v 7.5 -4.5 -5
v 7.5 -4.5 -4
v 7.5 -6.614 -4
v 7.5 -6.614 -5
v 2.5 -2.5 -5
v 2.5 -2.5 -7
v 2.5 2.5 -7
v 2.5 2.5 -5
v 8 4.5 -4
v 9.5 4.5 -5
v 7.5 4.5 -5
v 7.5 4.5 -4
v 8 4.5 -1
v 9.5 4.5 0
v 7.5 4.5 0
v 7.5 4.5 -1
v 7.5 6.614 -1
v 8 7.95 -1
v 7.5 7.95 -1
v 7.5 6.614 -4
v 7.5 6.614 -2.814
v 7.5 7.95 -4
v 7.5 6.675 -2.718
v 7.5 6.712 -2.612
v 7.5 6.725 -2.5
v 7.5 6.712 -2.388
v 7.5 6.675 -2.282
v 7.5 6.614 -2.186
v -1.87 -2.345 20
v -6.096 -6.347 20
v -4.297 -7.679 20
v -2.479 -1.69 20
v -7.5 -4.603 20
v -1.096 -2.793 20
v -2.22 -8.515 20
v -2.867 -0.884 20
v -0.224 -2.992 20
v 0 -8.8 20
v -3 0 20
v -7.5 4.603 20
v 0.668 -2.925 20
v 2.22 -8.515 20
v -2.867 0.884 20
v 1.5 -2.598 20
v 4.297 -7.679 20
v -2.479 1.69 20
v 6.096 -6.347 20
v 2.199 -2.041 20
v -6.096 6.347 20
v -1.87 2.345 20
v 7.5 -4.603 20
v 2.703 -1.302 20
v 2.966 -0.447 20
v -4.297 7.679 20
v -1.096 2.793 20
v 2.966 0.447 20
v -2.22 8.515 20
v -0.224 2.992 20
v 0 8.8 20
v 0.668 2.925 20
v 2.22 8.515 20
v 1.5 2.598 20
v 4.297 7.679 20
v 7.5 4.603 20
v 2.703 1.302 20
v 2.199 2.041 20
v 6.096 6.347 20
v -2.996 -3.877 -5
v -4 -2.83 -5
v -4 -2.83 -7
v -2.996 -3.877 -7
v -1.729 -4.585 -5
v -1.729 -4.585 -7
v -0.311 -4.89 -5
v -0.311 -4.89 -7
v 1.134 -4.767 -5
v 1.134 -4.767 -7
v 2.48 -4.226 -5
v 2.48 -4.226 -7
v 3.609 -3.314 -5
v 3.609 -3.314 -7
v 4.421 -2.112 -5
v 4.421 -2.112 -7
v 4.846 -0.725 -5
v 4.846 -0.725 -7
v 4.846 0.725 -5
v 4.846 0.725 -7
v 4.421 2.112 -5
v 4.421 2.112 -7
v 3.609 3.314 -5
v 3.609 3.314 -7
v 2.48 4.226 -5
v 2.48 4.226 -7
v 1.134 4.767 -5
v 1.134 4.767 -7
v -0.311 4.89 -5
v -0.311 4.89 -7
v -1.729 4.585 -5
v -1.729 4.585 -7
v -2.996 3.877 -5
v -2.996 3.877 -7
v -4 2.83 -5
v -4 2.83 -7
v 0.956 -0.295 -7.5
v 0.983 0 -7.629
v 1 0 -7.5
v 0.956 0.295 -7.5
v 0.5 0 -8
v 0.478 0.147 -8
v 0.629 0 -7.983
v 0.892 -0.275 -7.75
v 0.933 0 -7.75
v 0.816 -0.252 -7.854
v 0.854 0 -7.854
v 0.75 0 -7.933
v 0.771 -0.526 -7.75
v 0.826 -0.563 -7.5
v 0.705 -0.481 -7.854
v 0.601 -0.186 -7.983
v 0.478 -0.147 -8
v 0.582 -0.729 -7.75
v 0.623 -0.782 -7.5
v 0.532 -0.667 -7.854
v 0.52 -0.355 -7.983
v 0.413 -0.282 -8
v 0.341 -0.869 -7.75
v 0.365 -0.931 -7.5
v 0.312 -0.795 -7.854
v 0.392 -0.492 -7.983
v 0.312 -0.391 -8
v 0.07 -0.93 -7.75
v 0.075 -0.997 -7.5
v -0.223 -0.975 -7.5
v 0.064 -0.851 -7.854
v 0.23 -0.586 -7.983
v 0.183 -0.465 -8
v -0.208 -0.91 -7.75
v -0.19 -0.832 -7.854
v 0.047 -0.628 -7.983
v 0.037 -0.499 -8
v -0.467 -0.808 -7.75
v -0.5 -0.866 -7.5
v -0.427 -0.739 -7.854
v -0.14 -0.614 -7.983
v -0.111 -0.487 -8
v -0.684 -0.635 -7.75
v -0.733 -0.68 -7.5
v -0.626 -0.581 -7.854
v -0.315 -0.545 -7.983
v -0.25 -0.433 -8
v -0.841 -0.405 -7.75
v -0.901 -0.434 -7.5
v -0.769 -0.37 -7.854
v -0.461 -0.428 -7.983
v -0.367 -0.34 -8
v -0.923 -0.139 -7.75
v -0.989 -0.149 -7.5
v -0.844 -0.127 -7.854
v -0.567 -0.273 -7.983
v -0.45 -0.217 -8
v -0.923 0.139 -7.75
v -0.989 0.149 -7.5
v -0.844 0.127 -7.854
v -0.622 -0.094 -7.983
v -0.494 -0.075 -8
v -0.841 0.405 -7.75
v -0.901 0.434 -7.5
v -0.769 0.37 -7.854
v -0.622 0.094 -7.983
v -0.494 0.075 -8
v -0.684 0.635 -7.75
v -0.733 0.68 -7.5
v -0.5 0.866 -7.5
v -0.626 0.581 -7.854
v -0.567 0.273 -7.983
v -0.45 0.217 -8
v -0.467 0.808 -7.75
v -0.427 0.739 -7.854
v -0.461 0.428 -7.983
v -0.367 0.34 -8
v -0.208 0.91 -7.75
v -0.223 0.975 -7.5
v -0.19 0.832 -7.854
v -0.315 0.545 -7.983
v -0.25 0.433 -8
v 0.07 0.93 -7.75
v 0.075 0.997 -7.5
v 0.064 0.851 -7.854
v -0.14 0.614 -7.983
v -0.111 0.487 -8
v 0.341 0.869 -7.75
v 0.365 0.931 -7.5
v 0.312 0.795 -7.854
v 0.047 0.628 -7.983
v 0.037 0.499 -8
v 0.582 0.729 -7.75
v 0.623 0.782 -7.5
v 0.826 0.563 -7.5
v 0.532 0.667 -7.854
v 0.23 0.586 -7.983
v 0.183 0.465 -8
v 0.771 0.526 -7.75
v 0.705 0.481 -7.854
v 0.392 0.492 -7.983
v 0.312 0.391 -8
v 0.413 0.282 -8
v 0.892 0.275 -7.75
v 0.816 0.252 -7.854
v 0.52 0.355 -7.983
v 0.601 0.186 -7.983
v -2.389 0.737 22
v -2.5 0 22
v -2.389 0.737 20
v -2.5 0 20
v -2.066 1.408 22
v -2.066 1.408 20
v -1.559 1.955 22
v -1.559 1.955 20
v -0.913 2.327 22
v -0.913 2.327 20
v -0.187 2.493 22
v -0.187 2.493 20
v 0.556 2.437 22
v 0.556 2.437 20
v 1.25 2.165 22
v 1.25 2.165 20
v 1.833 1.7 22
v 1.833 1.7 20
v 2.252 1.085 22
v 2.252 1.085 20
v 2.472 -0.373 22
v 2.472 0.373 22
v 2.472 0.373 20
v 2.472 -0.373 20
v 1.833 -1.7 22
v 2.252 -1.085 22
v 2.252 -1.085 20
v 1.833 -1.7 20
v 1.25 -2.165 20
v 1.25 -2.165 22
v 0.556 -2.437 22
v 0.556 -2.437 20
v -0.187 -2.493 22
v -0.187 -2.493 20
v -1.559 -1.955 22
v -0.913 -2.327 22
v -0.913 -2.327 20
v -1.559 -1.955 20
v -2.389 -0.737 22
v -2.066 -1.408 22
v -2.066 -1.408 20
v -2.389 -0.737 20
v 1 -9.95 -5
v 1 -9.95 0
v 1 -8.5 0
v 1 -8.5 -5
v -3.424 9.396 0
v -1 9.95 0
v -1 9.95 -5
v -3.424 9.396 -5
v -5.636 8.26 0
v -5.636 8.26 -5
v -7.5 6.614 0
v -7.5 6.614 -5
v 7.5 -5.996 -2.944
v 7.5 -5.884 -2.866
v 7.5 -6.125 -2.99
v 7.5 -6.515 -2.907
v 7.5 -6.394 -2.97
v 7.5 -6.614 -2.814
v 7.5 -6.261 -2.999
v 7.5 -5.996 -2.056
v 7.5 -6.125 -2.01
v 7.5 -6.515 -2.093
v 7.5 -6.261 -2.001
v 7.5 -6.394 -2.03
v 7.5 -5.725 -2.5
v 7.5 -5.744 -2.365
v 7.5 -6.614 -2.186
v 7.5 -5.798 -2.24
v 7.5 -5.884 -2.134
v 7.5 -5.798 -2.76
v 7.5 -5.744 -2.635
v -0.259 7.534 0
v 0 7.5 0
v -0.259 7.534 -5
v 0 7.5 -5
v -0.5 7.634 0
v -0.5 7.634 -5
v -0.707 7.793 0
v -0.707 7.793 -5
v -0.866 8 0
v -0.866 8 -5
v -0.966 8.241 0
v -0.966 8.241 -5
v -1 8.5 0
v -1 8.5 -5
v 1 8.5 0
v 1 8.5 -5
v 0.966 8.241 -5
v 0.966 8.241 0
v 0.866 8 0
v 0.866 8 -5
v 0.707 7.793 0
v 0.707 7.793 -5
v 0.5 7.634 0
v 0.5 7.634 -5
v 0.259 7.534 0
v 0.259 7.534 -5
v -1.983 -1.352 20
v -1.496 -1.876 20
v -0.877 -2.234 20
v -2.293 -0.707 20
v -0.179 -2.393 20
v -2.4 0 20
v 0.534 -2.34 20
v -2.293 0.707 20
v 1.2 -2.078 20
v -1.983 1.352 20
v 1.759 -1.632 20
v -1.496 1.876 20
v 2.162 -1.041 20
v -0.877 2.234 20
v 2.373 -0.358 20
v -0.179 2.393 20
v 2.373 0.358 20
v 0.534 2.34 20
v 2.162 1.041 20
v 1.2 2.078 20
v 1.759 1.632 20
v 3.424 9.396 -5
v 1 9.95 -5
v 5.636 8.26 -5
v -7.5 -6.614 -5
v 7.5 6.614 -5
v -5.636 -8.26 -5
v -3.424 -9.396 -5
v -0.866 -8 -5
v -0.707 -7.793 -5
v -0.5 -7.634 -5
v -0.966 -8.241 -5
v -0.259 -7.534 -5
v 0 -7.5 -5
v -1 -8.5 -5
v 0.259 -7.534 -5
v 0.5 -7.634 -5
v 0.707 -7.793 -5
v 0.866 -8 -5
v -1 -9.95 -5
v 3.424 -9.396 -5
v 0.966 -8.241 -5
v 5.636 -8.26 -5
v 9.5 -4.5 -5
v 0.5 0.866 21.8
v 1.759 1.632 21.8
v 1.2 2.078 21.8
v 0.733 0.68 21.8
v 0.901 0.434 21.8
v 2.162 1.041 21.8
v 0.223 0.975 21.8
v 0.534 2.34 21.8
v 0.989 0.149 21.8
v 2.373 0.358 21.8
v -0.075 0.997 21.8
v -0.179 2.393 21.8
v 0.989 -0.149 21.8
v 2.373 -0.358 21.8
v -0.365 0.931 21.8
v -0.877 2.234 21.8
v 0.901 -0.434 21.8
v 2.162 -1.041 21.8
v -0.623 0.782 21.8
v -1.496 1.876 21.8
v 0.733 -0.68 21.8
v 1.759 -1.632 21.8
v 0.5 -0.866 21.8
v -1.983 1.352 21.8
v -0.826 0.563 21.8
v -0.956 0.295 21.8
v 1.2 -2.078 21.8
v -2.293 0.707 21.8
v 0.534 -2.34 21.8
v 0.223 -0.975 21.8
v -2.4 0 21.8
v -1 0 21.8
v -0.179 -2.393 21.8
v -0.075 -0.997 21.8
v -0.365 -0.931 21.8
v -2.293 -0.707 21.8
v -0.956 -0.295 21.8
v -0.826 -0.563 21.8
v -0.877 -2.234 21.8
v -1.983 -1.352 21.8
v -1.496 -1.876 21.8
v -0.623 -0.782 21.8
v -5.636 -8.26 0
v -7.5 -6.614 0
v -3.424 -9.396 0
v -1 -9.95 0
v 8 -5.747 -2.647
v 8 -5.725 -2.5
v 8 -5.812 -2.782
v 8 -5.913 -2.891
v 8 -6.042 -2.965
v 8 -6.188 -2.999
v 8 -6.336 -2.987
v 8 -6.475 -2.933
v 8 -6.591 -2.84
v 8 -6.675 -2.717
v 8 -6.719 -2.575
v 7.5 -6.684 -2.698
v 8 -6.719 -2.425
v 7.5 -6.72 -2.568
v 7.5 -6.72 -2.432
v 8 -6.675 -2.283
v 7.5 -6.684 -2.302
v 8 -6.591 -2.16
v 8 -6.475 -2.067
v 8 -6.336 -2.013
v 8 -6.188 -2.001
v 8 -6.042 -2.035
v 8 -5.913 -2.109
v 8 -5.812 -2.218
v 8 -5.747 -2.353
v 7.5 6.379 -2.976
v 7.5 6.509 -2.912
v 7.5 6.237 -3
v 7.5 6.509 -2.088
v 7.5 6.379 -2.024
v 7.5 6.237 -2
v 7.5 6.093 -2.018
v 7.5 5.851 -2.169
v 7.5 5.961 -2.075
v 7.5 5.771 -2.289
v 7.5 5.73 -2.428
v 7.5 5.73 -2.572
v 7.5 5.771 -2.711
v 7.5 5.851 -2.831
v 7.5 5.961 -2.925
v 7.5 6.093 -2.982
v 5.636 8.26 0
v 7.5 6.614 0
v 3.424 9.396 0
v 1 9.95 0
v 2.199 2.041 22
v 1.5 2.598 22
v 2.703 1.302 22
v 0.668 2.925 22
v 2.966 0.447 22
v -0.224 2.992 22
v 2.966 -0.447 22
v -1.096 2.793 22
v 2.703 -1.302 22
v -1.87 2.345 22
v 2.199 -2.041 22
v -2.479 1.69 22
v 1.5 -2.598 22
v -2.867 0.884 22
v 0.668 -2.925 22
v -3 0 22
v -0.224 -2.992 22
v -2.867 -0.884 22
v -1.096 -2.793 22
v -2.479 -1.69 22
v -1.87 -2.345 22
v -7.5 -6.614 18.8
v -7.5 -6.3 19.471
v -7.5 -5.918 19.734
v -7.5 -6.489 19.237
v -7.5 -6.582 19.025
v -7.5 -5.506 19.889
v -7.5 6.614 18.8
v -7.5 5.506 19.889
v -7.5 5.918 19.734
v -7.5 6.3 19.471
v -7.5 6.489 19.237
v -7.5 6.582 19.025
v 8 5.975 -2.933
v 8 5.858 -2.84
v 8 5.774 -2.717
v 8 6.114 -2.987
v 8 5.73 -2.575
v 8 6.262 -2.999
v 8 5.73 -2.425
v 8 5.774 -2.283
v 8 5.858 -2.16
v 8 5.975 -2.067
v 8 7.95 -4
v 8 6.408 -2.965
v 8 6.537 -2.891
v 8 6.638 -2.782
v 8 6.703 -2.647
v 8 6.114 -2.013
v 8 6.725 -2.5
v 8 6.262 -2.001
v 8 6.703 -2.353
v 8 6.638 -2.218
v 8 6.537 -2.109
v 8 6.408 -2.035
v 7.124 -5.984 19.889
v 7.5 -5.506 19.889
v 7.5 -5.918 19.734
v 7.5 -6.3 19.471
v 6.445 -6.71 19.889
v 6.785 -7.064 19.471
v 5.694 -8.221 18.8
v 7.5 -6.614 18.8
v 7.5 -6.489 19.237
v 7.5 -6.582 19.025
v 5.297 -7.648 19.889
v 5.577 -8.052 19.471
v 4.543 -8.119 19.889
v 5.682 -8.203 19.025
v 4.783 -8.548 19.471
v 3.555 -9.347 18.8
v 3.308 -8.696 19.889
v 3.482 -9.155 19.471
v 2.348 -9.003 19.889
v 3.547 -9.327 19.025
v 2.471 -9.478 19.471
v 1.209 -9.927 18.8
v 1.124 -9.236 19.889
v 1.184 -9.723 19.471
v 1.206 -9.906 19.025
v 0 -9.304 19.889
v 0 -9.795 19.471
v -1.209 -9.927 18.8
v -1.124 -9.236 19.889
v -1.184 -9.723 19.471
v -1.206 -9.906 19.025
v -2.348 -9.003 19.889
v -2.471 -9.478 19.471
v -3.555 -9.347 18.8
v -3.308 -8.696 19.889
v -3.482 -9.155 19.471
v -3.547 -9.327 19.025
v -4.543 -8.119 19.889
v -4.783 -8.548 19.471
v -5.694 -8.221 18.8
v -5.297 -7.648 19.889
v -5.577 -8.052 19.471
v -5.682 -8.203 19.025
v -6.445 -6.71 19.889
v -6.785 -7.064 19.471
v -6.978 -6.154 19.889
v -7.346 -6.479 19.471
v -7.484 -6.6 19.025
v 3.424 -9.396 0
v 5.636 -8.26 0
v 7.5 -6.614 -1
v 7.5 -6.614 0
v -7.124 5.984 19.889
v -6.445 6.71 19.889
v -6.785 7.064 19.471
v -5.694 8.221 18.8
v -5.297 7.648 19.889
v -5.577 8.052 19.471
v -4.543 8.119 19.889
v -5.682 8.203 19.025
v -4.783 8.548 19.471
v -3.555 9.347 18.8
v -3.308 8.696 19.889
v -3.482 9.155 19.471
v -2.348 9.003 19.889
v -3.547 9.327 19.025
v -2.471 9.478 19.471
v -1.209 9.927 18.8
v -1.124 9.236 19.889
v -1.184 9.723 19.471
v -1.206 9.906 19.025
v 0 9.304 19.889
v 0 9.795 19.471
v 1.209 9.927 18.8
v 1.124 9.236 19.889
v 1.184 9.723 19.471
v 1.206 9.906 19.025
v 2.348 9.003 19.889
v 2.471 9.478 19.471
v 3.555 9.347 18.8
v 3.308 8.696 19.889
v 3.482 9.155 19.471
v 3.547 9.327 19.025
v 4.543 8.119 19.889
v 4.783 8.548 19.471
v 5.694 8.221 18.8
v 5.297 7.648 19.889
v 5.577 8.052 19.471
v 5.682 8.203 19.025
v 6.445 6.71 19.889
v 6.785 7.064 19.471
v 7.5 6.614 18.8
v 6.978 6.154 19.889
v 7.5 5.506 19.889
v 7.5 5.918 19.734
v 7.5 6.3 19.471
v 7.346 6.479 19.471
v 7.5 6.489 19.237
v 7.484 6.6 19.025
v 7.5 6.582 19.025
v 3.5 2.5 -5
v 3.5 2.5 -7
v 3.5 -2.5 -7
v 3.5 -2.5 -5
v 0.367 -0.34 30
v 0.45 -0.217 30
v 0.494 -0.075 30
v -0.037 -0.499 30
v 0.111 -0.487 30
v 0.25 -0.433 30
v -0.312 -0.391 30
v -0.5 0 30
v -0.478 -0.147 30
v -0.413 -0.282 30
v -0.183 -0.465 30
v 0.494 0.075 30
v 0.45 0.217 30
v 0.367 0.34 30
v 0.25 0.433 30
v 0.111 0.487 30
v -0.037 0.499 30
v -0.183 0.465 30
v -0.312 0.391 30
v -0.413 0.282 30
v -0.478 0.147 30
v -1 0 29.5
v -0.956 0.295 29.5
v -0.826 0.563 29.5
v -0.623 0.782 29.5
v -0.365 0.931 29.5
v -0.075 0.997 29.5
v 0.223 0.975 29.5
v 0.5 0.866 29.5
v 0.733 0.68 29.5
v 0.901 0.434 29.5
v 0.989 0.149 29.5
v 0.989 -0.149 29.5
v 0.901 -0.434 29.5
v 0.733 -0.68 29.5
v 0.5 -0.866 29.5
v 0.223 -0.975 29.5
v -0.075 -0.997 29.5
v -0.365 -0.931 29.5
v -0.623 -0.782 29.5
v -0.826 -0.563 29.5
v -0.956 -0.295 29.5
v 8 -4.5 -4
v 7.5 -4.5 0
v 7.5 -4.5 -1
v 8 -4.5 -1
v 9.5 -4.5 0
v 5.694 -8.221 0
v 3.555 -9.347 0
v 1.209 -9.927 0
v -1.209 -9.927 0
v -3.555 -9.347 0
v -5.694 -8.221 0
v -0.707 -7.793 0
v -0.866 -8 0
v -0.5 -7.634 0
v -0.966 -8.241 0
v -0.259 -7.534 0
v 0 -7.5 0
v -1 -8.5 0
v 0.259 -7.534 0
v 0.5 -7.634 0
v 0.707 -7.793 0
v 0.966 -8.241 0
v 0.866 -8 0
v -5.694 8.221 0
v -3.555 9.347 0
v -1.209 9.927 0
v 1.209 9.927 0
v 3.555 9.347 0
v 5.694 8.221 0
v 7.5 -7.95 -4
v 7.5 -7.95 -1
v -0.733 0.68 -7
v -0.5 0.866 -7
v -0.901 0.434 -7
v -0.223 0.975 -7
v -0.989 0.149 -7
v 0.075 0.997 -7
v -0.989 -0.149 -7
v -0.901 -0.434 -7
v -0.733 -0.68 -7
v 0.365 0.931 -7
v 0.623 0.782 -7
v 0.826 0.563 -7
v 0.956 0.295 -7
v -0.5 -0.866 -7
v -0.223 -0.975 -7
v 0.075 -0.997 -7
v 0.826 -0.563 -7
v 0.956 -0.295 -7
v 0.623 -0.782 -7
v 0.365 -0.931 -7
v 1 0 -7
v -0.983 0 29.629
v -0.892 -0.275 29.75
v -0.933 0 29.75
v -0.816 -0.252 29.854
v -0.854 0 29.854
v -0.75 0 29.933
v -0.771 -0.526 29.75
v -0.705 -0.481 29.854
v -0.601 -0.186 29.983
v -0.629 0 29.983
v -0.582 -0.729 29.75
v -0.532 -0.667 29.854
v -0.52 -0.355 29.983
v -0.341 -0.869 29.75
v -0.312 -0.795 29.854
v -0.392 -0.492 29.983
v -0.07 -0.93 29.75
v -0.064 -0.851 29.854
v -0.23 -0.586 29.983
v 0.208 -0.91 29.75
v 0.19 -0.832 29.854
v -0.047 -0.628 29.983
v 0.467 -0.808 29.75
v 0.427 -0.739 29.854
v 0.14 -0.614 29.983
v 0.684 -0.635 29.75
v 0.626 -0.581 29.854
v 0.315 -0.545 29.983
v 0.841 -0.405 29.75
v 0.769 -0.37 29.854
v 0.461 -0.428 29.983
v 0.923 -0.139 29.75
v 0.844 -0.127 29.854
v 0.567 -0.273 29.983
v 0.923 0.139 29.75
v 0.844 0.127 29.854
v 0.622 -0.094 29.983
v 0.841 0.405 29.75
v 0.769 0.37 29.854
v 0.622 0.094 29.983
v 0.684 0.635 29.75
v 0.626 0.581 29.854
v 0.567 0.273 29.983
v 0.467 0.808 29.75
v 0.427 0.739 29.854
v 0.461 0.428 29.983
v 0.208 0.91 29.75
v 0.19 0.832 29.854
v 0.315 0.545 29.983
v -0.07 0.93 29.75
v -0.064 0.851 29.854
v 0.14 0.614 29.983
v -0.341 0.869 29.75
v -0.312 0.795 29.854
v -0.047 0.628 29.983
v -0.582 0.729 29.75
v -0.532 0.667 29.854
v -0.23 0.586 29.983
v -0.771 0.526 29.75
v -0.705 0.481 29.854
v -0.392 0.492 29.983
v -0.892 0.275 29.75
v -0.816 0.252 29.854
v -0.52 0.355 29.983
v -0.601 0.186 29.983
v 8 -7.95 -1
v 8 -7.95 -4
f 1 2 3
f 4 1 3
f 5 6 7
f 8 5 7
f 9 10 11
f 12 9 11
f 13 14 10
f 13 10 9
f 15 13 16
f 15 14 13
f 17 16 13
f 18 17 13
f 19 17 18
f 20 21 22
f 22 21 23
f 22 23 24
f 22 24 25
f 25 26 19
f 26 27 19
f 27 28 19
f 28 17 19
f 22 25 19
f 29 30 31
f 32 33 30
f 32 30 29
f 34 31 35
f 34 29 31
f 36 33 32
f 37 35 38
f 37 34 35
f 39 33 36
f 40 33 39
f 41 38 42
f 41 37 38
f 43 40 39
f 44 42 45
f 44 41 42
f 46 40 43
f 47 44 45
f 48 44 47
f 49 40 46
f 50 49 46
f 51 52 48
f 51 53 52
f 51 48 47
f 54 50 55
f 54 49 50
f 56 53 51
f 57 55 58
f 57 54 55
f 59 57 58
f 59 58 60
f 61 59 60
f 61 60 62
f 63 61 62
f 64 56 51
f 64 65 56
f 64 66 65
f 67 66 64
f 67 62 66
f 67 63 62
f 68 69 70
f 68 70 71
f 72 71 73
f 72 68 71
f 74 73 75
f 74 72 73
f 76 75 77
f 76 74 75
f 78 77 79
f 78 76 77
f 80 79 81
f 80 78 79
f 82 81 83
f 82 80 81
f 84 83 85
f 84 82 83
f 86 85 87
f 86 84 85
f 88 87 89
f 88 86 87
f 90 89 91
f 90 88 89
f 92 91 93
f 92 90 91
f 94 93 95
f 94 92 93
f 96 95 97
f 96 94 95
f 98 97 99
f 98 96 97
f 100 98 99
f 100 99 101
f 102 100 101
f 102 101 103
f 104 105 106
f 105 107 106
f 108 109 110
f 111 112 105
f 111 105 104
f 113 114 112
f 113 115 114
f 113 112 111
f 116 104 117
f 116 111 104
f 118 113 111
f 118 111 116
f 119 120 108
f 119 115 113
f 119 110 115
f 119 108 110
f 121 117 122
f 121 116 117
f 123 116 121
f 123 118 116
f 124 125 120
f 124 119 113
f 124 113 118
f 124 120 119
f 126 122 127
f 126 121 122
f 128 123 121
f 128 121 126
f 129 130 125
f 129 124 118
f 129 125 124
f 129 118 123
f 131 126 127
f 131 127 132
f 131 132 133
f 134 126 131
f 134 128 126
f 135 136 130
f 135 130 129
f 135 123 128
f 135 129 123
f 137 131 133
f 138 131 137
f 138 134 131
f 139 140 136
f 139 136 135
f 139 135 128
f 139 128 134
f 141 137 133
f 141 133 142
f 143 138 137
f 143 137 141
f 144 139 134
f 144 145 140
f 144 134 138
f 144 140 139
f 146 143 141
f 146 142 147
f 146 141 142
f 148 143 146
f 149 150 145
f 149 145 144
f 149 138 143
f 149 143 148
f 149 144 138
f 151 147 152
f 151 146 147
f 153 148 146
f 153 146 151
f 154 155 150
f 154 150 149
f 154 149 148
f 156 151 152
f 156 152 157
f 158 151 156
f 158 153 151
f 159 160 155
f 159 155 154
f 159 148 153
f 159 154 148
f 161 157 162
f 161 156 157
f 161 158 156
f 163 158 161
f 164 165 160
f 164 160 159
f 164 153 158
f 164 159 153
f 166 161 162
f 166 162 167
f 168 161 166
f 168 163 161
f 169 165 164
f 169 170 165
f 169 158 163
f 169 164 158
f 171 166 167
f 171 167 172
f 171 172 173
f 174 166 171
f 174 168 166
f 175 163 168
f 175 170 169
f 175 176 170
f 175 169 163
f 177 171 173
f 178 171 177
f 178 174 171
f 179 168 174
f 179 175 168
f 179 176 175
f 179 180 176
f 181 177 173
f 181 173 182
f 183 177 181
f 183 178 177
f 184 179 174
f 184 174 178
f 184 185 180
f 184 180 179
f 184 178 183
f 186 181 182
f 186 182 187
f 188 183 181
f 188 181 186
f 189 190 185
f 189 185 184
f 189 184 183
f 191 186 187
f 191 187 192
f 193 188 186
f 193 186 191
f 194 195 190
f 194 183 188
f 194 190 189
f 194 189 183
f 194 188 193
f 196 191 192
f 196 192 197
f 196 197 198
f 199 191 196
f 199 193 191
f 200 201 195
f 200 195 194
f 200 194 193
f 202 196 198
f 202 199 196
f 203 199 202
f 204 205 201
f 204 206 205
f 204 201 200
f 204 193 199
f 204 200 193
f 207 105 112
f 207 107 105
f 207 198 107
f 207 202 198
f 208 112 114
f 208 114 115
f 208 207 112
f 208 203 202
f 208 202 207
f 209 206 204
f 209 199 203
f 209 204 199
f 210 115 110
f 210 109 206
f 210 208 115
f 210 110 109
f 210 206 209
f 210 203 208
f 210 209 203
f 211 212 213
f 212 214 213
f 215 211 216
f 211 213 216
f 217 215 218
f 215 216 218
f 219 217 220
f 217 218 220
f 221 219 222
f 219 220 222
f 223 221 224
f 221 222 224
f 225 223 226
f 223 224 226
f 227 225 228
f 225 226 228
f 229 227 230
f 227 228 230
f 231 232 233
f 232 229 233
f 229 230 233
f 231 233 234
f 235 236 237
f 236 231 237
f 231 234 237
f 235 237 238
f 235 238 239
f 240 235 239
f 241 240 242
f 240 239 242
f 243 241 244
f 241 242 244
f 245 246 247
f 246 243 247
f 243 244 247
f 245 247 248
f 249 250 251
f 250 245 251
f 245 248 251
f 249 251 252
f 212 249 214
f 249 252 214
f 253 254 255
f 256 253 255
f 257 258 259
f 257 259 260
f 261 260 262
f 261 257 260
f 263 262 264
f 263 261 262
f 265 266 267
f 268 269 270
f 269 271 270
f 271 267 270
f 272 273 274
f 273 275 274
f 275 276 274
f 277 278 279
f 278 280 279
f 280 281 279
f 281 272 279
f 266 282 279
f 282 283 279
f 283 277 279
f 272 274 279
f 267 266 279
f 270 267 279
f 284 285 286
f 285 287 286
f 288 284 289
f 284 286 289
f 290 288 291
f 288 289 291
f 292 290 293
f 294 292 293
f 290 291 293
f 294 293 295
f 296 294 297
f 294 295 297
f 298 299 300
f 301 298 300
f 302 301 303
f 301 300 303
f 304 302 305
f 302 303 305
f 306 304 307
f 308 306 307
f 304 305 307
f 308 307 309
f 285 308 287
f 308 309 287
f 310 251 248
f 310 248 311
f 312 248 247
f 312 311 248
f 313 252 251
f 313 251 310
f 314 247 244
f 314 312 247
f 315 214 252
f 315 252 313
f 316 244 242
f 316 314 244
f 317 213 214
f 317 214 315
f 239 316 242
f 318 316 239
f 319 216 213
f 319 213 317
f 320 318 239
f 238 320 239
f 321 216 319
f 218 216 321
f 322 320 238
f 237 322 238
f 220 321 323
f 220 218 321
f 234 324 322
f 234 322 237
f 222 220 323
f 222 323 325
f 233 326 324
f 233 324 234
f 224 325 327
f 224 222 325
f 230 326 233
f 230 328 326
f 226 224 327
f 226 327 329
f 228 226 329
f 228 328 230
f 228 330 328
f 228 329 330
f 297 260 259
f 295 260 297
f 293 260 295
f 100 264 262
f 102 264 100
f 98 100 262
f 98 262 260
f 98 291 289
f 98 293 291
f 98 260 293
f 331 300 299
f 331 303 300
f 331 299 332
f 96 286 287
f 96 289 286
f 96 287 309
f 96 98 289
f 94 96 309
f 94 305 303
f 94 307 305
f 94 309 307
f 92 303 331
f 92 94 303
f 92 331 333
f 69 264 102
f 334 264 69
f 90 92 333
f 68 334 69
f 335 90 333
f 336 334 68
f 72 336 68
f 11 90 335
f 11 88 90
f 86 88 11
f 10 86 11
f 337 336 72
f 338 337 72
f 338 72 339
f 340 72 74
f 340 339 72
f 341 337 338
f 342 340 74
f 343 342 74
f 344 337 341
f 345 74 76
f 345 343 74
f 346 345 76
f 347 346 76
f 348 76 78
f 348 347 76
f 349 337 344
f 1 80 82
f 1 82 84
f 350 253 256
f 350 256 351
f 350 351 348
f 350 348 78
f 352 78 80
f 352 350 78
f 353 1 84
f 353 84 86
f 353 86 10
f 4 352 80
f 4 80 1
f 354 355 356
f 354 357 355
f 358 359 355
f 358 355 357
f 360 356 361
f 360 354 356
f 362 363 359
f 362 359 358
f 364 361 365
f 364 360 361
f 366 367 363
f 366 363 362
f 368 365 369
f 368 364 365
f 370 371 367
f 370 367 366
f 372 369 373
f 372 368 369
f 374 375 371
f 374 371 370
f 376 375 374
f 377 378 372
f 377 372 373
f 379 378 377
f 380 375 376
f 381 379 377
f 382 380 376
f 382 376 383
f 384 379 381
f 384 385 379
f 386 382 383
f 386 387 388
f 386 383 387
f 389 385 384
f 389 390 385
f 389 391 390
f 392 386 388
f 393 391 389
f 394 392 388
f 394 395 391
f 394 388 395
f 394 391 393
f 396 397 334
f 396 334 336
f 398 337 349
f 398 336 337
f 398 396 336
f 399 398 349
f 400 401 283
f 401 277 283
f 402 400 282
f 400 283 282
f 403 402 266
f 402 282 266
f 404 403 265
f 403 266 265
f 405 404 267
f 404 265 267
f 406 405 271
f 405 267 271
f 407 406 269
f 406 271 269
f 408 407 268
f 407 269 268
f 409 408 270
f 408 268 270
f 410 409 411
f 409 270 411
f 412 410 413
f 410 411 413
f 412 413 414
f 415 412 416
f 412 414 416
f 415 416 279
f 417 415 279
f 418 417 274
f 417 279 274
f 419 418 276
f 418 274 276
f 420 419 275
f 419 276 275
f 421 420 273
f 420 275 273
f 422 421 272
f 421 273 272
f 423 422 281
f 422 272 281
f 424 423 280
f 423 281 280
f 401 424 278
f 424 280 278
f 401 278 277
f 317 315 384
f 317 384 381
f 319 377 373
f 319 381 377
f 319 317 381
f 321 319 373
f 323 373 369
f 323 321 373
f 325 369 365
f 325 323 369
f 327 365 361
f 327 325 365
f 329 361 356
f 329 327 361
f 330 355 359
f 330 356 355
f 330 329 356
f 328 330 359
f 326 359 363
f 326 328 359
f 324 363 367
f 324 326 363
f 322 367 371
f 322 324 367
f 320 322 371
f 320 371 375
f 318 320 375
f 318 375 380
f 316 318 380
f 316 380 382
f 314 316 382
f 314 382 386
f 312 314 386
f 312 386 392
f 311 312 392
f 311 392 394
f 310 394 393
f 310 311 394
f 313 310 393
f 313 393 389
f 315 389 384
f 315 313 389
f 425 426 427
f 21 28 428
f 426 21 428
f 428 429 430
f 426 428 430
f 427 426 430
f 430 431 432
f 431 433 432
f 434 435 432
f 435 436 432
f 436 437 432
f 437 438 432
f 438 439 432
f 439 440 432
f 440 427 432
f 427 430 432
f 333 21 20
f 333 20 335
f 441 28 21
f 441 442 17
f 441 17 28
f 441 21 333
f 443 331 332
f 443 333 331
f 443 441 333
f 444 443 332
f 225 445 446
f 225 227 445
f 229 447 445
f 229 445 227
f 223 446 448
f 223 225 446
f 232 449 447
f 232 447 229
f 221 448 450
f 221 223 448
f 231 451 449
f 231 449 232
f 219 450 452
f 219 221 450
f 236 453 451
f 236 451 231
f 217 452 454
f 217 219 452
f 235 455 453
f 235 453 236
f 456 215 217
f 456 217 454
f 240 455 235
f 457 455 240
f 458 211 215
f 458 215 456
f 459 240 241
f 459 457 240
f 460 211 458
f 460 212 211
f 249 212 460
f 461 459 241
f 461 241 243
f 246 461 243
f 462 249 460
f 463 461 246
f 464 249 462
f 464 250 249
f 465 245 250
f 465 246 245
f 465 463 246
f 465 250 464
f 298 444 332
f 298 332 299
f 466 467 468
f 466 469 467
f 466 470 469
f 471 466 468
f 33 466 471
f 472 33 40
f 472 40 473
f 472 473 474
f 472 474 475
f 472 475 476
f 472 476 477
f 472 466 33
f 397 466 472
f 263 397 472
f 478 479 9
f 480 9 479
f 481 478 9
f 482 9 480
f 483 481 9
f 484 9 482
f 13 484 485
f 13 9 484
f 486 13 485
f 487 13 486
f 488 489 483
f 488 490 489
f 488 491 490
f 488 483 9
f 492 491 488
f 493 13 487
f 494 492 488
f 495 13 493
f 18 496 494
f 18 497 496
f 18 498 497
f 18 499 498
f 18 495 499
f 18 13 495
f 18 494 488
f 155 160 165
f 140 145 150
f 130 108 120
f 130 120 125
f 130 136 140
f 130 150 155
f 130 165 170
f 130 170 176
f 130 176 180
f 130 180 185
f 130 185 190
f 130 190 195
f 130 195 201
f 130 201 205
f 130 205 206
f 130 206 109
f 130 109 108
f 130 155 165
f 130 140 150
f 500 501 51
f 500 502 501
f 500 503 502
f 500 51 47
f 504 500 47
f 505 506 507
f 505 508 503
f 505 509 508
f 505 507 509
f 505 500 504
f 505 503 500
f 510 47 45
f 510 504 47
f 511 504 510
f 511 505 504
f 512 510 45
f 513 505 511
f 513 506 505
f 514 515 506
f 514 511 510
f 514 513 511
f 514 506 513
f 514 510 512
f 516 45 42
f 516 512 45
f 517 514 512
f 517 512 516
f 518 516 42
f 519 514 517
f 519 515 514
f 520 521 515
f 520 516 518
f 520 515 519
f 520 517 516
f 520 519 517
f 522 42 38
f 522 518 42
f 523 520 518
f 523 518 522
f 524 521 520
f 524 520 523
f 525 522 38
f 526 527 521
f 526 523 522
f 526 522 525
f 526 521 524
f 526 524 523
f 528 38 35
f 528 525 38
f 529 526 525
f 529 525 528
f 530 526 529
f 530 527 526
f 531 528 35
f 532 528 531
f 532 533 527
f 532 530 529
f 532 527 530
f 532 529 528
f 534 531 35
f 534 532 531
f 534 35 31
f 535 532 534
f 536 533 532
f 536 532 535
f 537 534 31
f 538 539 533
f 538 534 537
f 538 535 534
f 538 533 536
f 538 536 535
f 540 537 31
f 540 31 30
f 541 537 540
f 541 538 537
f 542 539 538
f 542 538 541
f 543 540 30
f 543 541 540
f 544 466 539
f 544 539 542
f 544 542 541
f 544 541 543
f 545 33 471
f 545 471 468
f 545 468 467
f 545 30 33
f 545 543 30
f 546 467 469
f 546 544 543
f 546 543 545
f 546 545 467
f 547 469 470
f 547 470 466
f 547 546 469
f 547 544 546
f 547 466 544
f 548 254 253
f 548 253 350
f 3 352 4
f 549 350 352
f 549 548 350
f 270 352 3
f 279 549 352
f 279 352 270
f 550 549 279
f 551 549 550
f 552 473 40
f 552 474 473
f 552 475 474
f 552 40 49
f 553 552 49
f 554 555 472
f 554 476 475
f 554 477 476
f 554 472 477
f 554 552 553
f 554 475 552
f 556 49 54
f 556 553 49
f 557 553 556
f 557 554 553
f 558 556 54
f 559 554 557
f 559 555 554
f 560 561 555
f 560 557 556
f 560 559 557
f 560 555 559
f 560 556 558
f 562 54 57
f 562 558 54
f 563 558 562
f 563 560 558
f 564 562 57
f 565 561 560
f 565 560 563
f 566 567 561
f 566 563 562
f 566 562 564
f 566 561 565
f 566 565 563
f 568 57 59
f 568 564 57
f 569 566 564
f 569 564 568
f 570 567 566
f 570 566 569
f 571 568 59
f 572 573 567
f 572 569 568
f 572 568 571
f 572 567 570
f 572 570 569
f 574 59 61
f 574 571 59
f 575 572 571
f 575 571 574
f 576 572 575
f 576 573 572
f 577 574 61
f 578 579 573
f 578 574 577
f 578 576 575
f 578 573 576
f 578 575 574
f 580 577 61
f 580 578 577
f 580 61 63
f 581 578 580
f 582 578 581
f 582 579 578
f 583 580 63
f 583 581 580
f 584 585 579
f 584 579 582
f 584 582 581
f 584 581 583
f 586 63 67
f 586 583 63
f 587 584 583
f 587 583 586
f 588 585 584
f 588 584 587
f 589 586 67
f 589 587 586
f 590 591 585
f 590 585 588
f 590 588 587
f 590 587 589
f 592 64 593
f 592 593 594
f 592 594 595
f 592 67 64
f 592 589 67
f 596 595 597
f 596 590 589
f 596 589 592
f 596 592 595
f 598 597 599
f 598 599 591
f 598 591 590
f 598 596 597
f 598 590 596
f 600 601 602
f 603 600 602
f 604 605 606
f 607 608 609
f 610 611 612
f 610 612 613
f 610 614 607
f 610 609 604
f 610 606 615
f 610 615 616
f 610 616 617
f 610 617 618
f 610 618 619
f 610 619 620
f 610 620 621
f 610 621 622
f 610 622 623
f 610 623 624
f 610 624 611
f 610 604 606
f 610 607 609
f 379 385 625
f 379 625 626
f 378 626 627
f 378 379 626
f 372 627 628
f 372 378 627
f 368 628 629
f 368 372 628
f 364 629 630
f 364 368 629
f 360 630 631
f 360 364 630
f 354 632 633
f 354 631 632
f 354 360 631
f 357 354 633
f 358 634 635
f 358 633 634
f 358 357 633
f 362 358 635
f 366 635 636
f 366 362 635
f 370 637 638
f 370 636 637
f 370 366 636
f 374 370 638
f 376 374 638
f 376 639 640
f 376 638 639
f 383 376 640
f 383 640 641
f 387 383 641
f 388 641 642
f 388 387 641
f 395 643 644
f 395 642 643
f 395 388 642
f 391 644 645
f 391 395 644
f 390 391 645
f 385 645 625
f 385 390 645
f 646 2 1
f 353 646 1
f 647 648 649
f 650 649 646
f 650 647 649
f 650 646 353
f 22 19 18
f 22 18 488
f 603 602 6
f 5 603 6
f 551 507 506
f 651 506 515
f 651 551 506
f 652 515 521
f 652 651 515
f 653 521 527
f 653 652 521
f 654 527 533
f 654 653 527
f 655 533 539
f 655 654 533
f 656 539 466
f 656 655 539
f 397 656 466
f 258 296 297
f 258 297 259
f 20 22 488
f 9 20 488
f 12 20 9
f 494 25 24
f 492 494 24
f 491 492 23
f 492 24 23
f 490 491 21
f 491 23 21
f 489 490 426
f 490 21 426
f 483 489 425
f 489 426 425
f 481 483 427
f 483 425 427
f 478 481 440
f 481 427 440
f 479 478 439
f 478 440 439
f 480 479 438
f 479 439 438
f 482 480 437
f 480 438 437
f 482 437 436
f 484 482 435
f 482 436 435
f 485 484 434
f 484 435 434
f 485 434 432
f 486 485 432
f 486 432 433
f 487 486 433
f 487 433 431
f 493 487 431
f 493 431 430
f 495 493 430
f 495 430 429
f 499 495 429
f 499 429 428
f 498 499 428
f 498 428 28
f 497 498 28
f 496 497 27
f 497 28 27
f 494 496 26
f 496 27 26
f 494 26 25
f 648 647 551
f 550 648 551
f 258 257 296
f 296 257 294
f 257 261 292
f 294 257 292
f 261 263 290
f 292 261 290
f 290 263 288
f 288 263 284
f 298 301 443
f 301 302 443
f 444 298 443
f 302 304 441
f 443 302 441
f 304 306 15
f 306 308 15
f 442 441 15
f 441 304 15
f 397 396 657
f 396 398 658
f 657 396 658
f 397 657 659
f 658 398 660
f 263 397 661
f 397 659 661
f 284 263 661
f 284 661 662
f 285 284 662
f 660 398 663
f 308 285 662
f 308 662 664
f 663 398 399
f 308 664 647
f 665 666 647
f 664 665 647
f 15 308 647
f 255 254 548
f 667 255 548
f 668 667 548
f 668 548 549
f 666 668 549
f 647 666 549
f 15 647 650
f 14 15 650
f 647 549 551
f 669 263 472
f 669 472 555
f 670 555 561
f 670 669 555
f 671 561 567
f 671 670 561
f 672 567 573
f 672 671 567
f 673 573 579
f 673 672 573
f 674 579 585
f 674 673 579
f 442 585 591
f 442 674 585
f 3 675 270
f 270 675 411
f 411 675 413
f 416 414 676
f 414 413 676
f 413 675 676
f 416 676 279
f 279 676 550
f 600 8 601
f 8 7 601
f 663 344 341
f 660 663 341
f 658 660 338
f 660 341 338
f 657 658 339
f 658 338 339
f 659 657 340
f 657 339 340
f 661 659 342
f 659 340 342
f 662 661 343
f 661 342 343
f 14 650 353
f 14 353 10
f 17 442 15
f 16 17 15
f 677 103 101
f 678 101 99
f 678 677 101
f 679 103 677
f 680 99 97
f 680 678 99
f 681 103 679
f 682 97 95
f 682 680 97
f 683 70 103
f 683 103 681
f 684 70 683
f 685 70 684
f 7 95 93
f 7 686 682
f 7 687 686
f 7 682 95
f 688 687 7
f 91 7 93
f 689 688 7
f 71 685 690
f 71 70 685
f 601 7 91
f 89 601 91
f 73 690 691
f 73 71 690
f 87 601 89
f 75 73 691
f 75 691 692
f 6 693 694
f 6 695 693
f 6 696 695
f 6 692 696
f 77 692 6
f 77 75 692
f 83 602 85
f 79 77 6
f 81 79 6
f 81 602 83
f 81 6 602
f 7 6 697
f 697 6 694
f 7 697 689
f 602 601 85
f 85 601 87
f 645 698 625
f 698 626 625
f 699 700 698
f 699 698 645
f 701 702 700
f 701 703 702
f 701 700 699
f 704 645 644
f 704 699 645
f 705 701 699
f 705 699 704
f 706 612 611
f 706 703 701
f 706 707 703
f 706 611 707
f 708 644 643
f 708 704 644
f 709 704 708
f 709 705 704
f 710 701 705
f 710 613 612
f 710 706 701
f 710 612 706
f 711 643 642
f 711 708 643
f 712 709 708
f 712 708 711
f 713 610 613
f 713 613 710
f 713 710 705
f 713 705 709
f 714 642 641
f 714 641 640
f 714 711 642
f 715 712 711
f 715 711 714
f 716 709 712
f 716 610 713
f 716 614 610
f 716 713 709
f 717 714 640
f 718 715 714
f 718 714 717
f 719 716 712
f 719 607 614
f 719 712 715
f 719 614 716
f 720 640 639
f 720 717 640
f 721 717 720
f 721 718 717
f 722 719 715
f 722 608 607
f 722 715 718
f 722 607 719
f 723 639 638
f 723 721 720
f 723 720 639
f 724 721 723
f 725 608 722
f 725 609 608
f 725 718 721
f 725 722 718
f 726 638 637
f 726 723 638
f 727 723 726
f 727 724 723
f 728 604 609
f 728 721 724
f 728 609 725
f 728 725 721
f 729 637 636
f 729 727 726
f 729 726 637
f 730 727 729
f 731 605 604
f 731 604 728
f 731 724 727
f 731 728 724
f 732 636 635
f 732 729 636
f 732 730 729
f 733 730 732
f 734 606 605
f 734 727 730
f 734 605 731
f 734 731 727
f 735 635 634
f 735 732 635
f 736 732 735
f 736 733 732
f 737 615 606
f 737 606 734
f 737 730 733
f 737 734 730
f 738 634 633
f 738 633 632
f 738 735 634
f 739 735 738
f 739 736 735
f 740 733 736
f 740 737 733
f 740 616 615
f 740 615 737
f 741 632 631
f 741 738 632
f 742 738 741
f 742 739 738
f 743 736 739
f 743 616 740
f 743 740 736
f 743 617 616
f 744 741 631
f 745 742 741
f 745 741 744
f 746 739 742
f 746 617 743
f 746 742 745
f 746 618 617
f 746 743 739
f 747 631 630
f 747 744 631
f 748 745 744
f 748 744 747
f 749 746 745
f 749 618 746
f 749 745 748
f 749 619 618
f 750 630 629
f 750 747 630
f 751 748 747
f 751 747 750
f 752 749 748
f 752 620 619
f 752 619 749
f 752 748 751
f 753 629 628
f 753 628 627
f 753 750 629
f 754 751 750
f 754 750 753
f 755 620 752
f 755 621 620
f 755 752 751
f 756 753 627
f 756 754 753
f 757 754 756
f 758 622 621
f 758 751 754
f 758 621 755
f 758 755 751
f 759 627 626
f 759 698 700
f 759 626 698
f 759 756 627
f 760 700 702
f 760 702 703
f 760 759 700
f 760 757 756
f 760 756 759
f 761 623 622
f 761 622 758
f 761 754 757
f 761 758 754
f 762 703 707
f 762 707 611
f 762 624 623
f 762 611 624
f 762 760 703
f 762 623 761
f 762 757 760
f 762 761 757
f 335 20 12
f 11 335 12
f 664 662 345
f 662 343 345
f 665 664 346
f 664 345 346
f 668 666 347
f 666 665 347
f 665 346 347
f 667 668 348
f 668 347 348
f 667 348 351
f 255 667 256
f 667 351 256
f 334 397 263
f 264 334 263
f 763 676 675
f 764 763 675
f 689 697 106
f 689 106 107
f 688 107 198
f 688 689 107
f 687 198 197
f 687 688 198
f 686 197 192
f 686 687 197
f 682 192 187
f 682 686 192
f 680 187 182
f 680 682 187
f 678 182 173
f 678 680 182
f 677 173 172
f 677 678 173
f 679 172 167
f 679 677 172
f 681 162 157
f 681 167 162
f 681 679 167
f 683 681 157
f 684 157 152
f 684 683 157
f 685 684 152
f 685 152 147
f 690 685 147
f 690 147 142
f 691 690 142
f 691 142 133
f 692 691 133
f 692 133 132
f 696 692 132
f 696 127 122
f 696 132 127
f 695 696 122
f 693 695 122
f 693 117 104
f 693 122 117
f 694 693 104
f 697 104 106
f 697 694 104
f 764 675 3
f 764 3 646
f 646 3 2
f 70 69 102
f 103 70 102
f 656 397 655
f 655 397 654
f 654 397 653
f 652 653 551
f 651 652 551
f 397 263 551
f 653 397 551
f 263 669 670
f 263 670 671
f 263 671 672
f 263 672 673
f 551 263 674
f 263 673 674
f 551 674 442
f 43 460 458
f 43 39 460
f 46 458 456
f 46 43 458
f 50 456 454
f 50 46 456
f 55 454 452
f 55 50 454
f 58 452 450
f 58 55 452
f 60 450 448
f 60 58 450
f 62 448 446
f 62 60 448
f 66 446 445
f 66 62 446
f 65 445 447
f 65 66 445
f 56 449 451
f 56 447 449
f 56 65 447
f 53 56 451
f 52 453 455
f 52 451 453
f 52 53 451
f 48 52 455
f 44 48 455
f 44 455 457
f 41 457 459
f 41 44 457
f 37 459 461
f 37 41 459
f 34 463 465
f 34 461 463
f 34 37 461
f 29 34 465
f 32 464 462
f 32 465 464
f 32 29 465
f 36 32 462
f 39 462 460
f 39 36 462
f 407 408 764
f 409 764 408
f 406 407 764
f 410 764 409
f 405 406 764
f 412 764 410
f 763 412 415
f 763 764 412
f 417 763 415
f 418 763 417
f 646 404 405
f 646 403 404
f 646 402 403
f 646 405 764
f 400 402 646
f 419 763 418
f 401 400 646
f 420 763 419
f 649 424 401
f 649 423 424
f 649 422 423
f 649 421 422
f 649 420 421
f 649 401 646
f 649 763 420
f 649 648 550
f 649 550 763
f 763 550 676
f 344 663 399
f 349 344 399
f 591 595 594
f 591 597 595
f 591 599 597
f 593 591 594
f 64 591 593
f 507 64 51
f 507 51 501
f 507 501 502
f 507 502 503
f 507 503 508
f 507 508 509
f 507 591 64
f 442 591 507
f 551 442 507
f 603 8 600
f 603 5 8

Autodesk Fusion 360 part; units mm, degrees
sketch "Sketch1" plane through (0, 0, 0) normal (0, 0, 1) x (1, 0, 0)
  line L0 (7.5, -10) -> (-7.5, -10)
  line L1 (-7.5, -10) -> (-7.5, 10)
  line L2 (-7.5, 10) -> (7.5, 10)
  line L3 (7.5, 10) -> (7.5, -10)
  line L4 (7.5, -10) -> (-7.5, 10) construction
  line L5 (-7.5, -10) -> (7.5, 10) construction
  circle A0 centre (0, 0) radius 10
  dimension "d1" = 15
  dimension "d2" = 20
  dimension "d3" = 20
extrude "Extrude1" add sketch "Sketch1" along normal blind 20 contours L1 L3 A0 makes body 1
sketch "Sketch2" plane through (0, 0, 20) normal (0, 0, 1) x (-1, 0, 0)
  arc A0 (7.5, 6.6144) -> (-7.5, 6.6144) centre (0, 0) ccw
  line L0 (-7.5, 6.6144) -> (-7.5, -6.6144)
  arc A1 (-7.5, -6.6144) -> (7.5, -6.6144) centre (0, 0) ccw
  line L1 (7.5, -6.6144) -> (7.5, 6.6144)
  circle A2 centre (0, 0) radius 3
  circle A3 centre (0, 0) radius 1
  circle A4 centre (0, 0) radius 2.5
  circle A5 centre (0, 0) radius 2.4
  dimension "d6" = 6
  dimension "d7" = 2
  dimension "d8" = 0.5
  dimension "d14" = 0.1
extrude "Extrude2" add sketch "Sketch2" along normal blind 2 contours A2 bodies 1
extrude "Extrude3" add sketch "Sketch2" along normal blind 10 contours A3 bodies 1
fillet "Fillet1" radius 0.5 1 edges at (0.9323, 0.3616, 30) on bodies 1
extrude "Extrude4" add sketch "Sketch2" along normal blind 1.8 contours A5 bodies 1
fillet "Fillet2" radius 1.2 2 edges at (0, -10, 20) (0, 10, 20) on bodies 1
sketch "Sketch3" plane through (0, 0, 0) normal (0, 0, -1) x (1, 0, 0)
  arc A0 (7.5, 6.6144) -> (-7.5, 6.6144) centre (0, 0) ccw
  line L0 (-7.5, 6.6144) -> (-7.5, -6.6144)
  arc A1 (-7.5, -6.6144) -> (7.5, -6.6144) centre (0, 0) ccw
  line L1 (7.5, -6.6144) -> (7.5, 6.6144)
  line L2 (-1, -10) -> (1, -10)
  line L3 (1, -10) -> (1, -7.5)
  line L4 (1, -7.5) -> (-1, -7.5)
  line L5 (-1, -7.5) -> (-1, -10)
  line L6 (0, 0) -> (-7.5, 0) construction
  line L7 (1, 10) -> (1, 7.5)
  line L8 (1, 7.5) -> (-1, 7.5)
  line L9 (-1, 7.5) -> (-1, 10)
  line L10 (-1, 10) -> (1, 10)
  line L11 (9.5, -4.5) -> (7.5, -4.5)
  line L12 (7.5, -4.5) -> (7.5, 4.5)
  line L13 (7.5, 4.5) -> (9.5, 4.5)
  line L14 (9.5, 4.5) -> (9.5, -4.5)
  line L15 (9.5, -4.5) -> (7.5, 4.5) construction
  line L16 (7.5, -4.5) -> (9.5, 4.5) construction
  point P0 (8.5, 0)
  dimension "d18" = 2.5
  dimension "d22" = 9
  dimension "d23" = 2
extrude "Extrude5" add sketch "Sketch3" along normal blind 5 separate body contours A0 L0 A1 L1 L3 L4 L5 L7 L8 L9 L12 | L1 L11 L12 L13 L14 makes body 2
fillet "Fillet3" radius 1 4 edges at (1, -7.5, -2.5) (-1, -7.5, -2.5) (1, 7.5, -2.5) (-1, 7.5, -2.5) on bodies 2
sketch "Sketch4" plane through (0, 0, -5) normal (0, 0, -1) x (1, 0, 0)
  line L0 (7.5, 4.5) -> (7.5, 6.6144)
  arc A0 (7.5, 6.6144) -> (1, 9.9499) centre (0, 0) ccw
  line L1 (1, 9.9499) -> (1, 8.5)
  arc A1 (0, 7.5) -> (1, 8.5) centre (0, 8.5) ccw
  arc A2 (-1, 8.5) -> (0, 7.5) centre (0, 8.5) ccw
  line L2 (-1, 8.5) -> (-1, 9.9499)
  arc A3 (-1, 9.9499) -> (-7.5, 6.6144) centre (0, 0) ccw
  line L3 (-7.5, 6.6144) -> (-7.5, -6.6144)
  arc A4 (-7.5, -6.6144) -> (-1, -9.9499) centre (0, 0) ccw
  line L4 (-1, -9.9499) -> (-1, -8.5)
  arc A5 (0, -7.5) -> (-1, -8.5) centre (0, -8.5) ccw
  arc A6 (1, -8.5) -> (0, -7.5) centre (0, -8.5) ccw
  line L5 (1, -8.5) -> (1, -9.9499)
  arc A7 (1, -9.9499) -> (7.5, -6.6144) centre (0, 0) ccw
  line L6 (7.5, -6.6144) -> (7.5, -4.5)
  line L7 (7.5, -4.5) -> (9.5, -4.5)
  line L8 (9.5, -4.5) -> (9.5, 4.5)
  line L9 (9.5, 4.5) -> (7.5, 4.5)
  circle A8 centre (0, 0) radius 4.9
  line L10 (-4, 5.5) -> (-4, -5.5)
  dimension "d24" = 9.8
  dimension "d26" = 4
extrude "Extrude6" add sketch "Sketch4" along normal blind 2 contours A8 L10 picked at (-0.1396, 1.4091) bodies 2
sketch "Sketch5" plane through (0, 0, -7) normal (0, 0, -1) x (1, 0, 0)
  arc A0 (-4, -2.8302) -> (-4, 2.8302) centre (0, 0) ccw
  line L0 (-4, 2.8302) -> (-4, -2.8302)
  circle A1 centre (0, 0) radius 1
  line L1 (2.5, -2.5) -> (3.5, -2.5)
  line L2 (3.5, -2.5) -> (3.5, 2.5)
  line L3 (3.5, 2.5) -> (2.5, 2.5)
  line L4 (2.5, 2.5) -> (2.5, -2.5)
  line L5 (2.5, -2.5) -> (3.5, 2.5) construction
  line L6 (3.5, -2.5) -> (2.5, 2.5) construction
  line L7 (3, 0) -> (0, 0) construction
  point P0 (3, 0)
  dimension "d29" = 2
  dimension "d33" = 1
  dimension "d34" = 5
  dimension "d35" = 3
extrude "Extrude8" cut sketch "Sketch5" against normal blind 2 contours L1 L2 L3 L4 bodies 2
extrude "Extrude7" add sketch "Sketch5" along normal blind 1 contours A1 bodies 2
fillet "Fillet4" radius 0.5 1 edges at (-0.9323, 0.3616, -8) on bodies 2
sketch "Sketch6" plane through (7.5, 0, 0) normal (1, 0, 0) x (0, 1, 0)
  line L0 (-4.5, 0) -> (-6.6144, 0)
  line L1 (-6.6144, 0) -> (-6.6144, -5) construction
  line L2 (-6.6144, -5) -> (-4.5, -5)
  line L3 (-4.5, -5) -> (-4.5, 0)
  line L4 (6.6144, 0) -> (4.5, 0)
  line L5 (4.5, 0) -> (4.5, -5)
  line L6 (4.5, -5) -> (6.6144, -5)
  line L7 (6.6144, -5) -> (6.6144, 0) construction
  line L8 (-4.5, -1) -> (-7.9499, -1)
  line L9 (-7.9499, -1) -> (-7.9499, -4)
  line L10 (-7.9499, -4) -> (-4.5, -4)
  line L11 (-4.5, -4) -> (-4.5, -1)
  line L12 (-9.9499, 0) -> (-9.9499, -5)
  line L13 (-9.9499, 0) -> (-6.6144, 0)
  line L14 (-9.9499, -5) -> (-6.6144, -5)
  line L15 (4.5, -5) -> (-4.5, -5)
  line L16 (0, 0) -> (0, -5) construction
  line L17 (7.9499, -4) -> (4.5, -4)
  line L18 (4.5, -4) -> (4.5, -1)
  line L19 (4.5, -1) -> (7.9499, -1)
  line L20 (7.9499, -1) -> (7.9499, -4)
  circle A0 centre (-6.2249, -2.5) radius 0.5
  circle A1 centre (6.2249, -2.5) radius 0.5
  dimension "d38" = 1
  dimension "d39" = 1
  dimension "d42" = 2
  dimension "d43" = 1
extrude "Extrude9" add sketch "Sketch6" along normal blind 0.5 contours L5 L17 L18 L19 L20 | L3 L8 L9 L10 L11 bodies 2
